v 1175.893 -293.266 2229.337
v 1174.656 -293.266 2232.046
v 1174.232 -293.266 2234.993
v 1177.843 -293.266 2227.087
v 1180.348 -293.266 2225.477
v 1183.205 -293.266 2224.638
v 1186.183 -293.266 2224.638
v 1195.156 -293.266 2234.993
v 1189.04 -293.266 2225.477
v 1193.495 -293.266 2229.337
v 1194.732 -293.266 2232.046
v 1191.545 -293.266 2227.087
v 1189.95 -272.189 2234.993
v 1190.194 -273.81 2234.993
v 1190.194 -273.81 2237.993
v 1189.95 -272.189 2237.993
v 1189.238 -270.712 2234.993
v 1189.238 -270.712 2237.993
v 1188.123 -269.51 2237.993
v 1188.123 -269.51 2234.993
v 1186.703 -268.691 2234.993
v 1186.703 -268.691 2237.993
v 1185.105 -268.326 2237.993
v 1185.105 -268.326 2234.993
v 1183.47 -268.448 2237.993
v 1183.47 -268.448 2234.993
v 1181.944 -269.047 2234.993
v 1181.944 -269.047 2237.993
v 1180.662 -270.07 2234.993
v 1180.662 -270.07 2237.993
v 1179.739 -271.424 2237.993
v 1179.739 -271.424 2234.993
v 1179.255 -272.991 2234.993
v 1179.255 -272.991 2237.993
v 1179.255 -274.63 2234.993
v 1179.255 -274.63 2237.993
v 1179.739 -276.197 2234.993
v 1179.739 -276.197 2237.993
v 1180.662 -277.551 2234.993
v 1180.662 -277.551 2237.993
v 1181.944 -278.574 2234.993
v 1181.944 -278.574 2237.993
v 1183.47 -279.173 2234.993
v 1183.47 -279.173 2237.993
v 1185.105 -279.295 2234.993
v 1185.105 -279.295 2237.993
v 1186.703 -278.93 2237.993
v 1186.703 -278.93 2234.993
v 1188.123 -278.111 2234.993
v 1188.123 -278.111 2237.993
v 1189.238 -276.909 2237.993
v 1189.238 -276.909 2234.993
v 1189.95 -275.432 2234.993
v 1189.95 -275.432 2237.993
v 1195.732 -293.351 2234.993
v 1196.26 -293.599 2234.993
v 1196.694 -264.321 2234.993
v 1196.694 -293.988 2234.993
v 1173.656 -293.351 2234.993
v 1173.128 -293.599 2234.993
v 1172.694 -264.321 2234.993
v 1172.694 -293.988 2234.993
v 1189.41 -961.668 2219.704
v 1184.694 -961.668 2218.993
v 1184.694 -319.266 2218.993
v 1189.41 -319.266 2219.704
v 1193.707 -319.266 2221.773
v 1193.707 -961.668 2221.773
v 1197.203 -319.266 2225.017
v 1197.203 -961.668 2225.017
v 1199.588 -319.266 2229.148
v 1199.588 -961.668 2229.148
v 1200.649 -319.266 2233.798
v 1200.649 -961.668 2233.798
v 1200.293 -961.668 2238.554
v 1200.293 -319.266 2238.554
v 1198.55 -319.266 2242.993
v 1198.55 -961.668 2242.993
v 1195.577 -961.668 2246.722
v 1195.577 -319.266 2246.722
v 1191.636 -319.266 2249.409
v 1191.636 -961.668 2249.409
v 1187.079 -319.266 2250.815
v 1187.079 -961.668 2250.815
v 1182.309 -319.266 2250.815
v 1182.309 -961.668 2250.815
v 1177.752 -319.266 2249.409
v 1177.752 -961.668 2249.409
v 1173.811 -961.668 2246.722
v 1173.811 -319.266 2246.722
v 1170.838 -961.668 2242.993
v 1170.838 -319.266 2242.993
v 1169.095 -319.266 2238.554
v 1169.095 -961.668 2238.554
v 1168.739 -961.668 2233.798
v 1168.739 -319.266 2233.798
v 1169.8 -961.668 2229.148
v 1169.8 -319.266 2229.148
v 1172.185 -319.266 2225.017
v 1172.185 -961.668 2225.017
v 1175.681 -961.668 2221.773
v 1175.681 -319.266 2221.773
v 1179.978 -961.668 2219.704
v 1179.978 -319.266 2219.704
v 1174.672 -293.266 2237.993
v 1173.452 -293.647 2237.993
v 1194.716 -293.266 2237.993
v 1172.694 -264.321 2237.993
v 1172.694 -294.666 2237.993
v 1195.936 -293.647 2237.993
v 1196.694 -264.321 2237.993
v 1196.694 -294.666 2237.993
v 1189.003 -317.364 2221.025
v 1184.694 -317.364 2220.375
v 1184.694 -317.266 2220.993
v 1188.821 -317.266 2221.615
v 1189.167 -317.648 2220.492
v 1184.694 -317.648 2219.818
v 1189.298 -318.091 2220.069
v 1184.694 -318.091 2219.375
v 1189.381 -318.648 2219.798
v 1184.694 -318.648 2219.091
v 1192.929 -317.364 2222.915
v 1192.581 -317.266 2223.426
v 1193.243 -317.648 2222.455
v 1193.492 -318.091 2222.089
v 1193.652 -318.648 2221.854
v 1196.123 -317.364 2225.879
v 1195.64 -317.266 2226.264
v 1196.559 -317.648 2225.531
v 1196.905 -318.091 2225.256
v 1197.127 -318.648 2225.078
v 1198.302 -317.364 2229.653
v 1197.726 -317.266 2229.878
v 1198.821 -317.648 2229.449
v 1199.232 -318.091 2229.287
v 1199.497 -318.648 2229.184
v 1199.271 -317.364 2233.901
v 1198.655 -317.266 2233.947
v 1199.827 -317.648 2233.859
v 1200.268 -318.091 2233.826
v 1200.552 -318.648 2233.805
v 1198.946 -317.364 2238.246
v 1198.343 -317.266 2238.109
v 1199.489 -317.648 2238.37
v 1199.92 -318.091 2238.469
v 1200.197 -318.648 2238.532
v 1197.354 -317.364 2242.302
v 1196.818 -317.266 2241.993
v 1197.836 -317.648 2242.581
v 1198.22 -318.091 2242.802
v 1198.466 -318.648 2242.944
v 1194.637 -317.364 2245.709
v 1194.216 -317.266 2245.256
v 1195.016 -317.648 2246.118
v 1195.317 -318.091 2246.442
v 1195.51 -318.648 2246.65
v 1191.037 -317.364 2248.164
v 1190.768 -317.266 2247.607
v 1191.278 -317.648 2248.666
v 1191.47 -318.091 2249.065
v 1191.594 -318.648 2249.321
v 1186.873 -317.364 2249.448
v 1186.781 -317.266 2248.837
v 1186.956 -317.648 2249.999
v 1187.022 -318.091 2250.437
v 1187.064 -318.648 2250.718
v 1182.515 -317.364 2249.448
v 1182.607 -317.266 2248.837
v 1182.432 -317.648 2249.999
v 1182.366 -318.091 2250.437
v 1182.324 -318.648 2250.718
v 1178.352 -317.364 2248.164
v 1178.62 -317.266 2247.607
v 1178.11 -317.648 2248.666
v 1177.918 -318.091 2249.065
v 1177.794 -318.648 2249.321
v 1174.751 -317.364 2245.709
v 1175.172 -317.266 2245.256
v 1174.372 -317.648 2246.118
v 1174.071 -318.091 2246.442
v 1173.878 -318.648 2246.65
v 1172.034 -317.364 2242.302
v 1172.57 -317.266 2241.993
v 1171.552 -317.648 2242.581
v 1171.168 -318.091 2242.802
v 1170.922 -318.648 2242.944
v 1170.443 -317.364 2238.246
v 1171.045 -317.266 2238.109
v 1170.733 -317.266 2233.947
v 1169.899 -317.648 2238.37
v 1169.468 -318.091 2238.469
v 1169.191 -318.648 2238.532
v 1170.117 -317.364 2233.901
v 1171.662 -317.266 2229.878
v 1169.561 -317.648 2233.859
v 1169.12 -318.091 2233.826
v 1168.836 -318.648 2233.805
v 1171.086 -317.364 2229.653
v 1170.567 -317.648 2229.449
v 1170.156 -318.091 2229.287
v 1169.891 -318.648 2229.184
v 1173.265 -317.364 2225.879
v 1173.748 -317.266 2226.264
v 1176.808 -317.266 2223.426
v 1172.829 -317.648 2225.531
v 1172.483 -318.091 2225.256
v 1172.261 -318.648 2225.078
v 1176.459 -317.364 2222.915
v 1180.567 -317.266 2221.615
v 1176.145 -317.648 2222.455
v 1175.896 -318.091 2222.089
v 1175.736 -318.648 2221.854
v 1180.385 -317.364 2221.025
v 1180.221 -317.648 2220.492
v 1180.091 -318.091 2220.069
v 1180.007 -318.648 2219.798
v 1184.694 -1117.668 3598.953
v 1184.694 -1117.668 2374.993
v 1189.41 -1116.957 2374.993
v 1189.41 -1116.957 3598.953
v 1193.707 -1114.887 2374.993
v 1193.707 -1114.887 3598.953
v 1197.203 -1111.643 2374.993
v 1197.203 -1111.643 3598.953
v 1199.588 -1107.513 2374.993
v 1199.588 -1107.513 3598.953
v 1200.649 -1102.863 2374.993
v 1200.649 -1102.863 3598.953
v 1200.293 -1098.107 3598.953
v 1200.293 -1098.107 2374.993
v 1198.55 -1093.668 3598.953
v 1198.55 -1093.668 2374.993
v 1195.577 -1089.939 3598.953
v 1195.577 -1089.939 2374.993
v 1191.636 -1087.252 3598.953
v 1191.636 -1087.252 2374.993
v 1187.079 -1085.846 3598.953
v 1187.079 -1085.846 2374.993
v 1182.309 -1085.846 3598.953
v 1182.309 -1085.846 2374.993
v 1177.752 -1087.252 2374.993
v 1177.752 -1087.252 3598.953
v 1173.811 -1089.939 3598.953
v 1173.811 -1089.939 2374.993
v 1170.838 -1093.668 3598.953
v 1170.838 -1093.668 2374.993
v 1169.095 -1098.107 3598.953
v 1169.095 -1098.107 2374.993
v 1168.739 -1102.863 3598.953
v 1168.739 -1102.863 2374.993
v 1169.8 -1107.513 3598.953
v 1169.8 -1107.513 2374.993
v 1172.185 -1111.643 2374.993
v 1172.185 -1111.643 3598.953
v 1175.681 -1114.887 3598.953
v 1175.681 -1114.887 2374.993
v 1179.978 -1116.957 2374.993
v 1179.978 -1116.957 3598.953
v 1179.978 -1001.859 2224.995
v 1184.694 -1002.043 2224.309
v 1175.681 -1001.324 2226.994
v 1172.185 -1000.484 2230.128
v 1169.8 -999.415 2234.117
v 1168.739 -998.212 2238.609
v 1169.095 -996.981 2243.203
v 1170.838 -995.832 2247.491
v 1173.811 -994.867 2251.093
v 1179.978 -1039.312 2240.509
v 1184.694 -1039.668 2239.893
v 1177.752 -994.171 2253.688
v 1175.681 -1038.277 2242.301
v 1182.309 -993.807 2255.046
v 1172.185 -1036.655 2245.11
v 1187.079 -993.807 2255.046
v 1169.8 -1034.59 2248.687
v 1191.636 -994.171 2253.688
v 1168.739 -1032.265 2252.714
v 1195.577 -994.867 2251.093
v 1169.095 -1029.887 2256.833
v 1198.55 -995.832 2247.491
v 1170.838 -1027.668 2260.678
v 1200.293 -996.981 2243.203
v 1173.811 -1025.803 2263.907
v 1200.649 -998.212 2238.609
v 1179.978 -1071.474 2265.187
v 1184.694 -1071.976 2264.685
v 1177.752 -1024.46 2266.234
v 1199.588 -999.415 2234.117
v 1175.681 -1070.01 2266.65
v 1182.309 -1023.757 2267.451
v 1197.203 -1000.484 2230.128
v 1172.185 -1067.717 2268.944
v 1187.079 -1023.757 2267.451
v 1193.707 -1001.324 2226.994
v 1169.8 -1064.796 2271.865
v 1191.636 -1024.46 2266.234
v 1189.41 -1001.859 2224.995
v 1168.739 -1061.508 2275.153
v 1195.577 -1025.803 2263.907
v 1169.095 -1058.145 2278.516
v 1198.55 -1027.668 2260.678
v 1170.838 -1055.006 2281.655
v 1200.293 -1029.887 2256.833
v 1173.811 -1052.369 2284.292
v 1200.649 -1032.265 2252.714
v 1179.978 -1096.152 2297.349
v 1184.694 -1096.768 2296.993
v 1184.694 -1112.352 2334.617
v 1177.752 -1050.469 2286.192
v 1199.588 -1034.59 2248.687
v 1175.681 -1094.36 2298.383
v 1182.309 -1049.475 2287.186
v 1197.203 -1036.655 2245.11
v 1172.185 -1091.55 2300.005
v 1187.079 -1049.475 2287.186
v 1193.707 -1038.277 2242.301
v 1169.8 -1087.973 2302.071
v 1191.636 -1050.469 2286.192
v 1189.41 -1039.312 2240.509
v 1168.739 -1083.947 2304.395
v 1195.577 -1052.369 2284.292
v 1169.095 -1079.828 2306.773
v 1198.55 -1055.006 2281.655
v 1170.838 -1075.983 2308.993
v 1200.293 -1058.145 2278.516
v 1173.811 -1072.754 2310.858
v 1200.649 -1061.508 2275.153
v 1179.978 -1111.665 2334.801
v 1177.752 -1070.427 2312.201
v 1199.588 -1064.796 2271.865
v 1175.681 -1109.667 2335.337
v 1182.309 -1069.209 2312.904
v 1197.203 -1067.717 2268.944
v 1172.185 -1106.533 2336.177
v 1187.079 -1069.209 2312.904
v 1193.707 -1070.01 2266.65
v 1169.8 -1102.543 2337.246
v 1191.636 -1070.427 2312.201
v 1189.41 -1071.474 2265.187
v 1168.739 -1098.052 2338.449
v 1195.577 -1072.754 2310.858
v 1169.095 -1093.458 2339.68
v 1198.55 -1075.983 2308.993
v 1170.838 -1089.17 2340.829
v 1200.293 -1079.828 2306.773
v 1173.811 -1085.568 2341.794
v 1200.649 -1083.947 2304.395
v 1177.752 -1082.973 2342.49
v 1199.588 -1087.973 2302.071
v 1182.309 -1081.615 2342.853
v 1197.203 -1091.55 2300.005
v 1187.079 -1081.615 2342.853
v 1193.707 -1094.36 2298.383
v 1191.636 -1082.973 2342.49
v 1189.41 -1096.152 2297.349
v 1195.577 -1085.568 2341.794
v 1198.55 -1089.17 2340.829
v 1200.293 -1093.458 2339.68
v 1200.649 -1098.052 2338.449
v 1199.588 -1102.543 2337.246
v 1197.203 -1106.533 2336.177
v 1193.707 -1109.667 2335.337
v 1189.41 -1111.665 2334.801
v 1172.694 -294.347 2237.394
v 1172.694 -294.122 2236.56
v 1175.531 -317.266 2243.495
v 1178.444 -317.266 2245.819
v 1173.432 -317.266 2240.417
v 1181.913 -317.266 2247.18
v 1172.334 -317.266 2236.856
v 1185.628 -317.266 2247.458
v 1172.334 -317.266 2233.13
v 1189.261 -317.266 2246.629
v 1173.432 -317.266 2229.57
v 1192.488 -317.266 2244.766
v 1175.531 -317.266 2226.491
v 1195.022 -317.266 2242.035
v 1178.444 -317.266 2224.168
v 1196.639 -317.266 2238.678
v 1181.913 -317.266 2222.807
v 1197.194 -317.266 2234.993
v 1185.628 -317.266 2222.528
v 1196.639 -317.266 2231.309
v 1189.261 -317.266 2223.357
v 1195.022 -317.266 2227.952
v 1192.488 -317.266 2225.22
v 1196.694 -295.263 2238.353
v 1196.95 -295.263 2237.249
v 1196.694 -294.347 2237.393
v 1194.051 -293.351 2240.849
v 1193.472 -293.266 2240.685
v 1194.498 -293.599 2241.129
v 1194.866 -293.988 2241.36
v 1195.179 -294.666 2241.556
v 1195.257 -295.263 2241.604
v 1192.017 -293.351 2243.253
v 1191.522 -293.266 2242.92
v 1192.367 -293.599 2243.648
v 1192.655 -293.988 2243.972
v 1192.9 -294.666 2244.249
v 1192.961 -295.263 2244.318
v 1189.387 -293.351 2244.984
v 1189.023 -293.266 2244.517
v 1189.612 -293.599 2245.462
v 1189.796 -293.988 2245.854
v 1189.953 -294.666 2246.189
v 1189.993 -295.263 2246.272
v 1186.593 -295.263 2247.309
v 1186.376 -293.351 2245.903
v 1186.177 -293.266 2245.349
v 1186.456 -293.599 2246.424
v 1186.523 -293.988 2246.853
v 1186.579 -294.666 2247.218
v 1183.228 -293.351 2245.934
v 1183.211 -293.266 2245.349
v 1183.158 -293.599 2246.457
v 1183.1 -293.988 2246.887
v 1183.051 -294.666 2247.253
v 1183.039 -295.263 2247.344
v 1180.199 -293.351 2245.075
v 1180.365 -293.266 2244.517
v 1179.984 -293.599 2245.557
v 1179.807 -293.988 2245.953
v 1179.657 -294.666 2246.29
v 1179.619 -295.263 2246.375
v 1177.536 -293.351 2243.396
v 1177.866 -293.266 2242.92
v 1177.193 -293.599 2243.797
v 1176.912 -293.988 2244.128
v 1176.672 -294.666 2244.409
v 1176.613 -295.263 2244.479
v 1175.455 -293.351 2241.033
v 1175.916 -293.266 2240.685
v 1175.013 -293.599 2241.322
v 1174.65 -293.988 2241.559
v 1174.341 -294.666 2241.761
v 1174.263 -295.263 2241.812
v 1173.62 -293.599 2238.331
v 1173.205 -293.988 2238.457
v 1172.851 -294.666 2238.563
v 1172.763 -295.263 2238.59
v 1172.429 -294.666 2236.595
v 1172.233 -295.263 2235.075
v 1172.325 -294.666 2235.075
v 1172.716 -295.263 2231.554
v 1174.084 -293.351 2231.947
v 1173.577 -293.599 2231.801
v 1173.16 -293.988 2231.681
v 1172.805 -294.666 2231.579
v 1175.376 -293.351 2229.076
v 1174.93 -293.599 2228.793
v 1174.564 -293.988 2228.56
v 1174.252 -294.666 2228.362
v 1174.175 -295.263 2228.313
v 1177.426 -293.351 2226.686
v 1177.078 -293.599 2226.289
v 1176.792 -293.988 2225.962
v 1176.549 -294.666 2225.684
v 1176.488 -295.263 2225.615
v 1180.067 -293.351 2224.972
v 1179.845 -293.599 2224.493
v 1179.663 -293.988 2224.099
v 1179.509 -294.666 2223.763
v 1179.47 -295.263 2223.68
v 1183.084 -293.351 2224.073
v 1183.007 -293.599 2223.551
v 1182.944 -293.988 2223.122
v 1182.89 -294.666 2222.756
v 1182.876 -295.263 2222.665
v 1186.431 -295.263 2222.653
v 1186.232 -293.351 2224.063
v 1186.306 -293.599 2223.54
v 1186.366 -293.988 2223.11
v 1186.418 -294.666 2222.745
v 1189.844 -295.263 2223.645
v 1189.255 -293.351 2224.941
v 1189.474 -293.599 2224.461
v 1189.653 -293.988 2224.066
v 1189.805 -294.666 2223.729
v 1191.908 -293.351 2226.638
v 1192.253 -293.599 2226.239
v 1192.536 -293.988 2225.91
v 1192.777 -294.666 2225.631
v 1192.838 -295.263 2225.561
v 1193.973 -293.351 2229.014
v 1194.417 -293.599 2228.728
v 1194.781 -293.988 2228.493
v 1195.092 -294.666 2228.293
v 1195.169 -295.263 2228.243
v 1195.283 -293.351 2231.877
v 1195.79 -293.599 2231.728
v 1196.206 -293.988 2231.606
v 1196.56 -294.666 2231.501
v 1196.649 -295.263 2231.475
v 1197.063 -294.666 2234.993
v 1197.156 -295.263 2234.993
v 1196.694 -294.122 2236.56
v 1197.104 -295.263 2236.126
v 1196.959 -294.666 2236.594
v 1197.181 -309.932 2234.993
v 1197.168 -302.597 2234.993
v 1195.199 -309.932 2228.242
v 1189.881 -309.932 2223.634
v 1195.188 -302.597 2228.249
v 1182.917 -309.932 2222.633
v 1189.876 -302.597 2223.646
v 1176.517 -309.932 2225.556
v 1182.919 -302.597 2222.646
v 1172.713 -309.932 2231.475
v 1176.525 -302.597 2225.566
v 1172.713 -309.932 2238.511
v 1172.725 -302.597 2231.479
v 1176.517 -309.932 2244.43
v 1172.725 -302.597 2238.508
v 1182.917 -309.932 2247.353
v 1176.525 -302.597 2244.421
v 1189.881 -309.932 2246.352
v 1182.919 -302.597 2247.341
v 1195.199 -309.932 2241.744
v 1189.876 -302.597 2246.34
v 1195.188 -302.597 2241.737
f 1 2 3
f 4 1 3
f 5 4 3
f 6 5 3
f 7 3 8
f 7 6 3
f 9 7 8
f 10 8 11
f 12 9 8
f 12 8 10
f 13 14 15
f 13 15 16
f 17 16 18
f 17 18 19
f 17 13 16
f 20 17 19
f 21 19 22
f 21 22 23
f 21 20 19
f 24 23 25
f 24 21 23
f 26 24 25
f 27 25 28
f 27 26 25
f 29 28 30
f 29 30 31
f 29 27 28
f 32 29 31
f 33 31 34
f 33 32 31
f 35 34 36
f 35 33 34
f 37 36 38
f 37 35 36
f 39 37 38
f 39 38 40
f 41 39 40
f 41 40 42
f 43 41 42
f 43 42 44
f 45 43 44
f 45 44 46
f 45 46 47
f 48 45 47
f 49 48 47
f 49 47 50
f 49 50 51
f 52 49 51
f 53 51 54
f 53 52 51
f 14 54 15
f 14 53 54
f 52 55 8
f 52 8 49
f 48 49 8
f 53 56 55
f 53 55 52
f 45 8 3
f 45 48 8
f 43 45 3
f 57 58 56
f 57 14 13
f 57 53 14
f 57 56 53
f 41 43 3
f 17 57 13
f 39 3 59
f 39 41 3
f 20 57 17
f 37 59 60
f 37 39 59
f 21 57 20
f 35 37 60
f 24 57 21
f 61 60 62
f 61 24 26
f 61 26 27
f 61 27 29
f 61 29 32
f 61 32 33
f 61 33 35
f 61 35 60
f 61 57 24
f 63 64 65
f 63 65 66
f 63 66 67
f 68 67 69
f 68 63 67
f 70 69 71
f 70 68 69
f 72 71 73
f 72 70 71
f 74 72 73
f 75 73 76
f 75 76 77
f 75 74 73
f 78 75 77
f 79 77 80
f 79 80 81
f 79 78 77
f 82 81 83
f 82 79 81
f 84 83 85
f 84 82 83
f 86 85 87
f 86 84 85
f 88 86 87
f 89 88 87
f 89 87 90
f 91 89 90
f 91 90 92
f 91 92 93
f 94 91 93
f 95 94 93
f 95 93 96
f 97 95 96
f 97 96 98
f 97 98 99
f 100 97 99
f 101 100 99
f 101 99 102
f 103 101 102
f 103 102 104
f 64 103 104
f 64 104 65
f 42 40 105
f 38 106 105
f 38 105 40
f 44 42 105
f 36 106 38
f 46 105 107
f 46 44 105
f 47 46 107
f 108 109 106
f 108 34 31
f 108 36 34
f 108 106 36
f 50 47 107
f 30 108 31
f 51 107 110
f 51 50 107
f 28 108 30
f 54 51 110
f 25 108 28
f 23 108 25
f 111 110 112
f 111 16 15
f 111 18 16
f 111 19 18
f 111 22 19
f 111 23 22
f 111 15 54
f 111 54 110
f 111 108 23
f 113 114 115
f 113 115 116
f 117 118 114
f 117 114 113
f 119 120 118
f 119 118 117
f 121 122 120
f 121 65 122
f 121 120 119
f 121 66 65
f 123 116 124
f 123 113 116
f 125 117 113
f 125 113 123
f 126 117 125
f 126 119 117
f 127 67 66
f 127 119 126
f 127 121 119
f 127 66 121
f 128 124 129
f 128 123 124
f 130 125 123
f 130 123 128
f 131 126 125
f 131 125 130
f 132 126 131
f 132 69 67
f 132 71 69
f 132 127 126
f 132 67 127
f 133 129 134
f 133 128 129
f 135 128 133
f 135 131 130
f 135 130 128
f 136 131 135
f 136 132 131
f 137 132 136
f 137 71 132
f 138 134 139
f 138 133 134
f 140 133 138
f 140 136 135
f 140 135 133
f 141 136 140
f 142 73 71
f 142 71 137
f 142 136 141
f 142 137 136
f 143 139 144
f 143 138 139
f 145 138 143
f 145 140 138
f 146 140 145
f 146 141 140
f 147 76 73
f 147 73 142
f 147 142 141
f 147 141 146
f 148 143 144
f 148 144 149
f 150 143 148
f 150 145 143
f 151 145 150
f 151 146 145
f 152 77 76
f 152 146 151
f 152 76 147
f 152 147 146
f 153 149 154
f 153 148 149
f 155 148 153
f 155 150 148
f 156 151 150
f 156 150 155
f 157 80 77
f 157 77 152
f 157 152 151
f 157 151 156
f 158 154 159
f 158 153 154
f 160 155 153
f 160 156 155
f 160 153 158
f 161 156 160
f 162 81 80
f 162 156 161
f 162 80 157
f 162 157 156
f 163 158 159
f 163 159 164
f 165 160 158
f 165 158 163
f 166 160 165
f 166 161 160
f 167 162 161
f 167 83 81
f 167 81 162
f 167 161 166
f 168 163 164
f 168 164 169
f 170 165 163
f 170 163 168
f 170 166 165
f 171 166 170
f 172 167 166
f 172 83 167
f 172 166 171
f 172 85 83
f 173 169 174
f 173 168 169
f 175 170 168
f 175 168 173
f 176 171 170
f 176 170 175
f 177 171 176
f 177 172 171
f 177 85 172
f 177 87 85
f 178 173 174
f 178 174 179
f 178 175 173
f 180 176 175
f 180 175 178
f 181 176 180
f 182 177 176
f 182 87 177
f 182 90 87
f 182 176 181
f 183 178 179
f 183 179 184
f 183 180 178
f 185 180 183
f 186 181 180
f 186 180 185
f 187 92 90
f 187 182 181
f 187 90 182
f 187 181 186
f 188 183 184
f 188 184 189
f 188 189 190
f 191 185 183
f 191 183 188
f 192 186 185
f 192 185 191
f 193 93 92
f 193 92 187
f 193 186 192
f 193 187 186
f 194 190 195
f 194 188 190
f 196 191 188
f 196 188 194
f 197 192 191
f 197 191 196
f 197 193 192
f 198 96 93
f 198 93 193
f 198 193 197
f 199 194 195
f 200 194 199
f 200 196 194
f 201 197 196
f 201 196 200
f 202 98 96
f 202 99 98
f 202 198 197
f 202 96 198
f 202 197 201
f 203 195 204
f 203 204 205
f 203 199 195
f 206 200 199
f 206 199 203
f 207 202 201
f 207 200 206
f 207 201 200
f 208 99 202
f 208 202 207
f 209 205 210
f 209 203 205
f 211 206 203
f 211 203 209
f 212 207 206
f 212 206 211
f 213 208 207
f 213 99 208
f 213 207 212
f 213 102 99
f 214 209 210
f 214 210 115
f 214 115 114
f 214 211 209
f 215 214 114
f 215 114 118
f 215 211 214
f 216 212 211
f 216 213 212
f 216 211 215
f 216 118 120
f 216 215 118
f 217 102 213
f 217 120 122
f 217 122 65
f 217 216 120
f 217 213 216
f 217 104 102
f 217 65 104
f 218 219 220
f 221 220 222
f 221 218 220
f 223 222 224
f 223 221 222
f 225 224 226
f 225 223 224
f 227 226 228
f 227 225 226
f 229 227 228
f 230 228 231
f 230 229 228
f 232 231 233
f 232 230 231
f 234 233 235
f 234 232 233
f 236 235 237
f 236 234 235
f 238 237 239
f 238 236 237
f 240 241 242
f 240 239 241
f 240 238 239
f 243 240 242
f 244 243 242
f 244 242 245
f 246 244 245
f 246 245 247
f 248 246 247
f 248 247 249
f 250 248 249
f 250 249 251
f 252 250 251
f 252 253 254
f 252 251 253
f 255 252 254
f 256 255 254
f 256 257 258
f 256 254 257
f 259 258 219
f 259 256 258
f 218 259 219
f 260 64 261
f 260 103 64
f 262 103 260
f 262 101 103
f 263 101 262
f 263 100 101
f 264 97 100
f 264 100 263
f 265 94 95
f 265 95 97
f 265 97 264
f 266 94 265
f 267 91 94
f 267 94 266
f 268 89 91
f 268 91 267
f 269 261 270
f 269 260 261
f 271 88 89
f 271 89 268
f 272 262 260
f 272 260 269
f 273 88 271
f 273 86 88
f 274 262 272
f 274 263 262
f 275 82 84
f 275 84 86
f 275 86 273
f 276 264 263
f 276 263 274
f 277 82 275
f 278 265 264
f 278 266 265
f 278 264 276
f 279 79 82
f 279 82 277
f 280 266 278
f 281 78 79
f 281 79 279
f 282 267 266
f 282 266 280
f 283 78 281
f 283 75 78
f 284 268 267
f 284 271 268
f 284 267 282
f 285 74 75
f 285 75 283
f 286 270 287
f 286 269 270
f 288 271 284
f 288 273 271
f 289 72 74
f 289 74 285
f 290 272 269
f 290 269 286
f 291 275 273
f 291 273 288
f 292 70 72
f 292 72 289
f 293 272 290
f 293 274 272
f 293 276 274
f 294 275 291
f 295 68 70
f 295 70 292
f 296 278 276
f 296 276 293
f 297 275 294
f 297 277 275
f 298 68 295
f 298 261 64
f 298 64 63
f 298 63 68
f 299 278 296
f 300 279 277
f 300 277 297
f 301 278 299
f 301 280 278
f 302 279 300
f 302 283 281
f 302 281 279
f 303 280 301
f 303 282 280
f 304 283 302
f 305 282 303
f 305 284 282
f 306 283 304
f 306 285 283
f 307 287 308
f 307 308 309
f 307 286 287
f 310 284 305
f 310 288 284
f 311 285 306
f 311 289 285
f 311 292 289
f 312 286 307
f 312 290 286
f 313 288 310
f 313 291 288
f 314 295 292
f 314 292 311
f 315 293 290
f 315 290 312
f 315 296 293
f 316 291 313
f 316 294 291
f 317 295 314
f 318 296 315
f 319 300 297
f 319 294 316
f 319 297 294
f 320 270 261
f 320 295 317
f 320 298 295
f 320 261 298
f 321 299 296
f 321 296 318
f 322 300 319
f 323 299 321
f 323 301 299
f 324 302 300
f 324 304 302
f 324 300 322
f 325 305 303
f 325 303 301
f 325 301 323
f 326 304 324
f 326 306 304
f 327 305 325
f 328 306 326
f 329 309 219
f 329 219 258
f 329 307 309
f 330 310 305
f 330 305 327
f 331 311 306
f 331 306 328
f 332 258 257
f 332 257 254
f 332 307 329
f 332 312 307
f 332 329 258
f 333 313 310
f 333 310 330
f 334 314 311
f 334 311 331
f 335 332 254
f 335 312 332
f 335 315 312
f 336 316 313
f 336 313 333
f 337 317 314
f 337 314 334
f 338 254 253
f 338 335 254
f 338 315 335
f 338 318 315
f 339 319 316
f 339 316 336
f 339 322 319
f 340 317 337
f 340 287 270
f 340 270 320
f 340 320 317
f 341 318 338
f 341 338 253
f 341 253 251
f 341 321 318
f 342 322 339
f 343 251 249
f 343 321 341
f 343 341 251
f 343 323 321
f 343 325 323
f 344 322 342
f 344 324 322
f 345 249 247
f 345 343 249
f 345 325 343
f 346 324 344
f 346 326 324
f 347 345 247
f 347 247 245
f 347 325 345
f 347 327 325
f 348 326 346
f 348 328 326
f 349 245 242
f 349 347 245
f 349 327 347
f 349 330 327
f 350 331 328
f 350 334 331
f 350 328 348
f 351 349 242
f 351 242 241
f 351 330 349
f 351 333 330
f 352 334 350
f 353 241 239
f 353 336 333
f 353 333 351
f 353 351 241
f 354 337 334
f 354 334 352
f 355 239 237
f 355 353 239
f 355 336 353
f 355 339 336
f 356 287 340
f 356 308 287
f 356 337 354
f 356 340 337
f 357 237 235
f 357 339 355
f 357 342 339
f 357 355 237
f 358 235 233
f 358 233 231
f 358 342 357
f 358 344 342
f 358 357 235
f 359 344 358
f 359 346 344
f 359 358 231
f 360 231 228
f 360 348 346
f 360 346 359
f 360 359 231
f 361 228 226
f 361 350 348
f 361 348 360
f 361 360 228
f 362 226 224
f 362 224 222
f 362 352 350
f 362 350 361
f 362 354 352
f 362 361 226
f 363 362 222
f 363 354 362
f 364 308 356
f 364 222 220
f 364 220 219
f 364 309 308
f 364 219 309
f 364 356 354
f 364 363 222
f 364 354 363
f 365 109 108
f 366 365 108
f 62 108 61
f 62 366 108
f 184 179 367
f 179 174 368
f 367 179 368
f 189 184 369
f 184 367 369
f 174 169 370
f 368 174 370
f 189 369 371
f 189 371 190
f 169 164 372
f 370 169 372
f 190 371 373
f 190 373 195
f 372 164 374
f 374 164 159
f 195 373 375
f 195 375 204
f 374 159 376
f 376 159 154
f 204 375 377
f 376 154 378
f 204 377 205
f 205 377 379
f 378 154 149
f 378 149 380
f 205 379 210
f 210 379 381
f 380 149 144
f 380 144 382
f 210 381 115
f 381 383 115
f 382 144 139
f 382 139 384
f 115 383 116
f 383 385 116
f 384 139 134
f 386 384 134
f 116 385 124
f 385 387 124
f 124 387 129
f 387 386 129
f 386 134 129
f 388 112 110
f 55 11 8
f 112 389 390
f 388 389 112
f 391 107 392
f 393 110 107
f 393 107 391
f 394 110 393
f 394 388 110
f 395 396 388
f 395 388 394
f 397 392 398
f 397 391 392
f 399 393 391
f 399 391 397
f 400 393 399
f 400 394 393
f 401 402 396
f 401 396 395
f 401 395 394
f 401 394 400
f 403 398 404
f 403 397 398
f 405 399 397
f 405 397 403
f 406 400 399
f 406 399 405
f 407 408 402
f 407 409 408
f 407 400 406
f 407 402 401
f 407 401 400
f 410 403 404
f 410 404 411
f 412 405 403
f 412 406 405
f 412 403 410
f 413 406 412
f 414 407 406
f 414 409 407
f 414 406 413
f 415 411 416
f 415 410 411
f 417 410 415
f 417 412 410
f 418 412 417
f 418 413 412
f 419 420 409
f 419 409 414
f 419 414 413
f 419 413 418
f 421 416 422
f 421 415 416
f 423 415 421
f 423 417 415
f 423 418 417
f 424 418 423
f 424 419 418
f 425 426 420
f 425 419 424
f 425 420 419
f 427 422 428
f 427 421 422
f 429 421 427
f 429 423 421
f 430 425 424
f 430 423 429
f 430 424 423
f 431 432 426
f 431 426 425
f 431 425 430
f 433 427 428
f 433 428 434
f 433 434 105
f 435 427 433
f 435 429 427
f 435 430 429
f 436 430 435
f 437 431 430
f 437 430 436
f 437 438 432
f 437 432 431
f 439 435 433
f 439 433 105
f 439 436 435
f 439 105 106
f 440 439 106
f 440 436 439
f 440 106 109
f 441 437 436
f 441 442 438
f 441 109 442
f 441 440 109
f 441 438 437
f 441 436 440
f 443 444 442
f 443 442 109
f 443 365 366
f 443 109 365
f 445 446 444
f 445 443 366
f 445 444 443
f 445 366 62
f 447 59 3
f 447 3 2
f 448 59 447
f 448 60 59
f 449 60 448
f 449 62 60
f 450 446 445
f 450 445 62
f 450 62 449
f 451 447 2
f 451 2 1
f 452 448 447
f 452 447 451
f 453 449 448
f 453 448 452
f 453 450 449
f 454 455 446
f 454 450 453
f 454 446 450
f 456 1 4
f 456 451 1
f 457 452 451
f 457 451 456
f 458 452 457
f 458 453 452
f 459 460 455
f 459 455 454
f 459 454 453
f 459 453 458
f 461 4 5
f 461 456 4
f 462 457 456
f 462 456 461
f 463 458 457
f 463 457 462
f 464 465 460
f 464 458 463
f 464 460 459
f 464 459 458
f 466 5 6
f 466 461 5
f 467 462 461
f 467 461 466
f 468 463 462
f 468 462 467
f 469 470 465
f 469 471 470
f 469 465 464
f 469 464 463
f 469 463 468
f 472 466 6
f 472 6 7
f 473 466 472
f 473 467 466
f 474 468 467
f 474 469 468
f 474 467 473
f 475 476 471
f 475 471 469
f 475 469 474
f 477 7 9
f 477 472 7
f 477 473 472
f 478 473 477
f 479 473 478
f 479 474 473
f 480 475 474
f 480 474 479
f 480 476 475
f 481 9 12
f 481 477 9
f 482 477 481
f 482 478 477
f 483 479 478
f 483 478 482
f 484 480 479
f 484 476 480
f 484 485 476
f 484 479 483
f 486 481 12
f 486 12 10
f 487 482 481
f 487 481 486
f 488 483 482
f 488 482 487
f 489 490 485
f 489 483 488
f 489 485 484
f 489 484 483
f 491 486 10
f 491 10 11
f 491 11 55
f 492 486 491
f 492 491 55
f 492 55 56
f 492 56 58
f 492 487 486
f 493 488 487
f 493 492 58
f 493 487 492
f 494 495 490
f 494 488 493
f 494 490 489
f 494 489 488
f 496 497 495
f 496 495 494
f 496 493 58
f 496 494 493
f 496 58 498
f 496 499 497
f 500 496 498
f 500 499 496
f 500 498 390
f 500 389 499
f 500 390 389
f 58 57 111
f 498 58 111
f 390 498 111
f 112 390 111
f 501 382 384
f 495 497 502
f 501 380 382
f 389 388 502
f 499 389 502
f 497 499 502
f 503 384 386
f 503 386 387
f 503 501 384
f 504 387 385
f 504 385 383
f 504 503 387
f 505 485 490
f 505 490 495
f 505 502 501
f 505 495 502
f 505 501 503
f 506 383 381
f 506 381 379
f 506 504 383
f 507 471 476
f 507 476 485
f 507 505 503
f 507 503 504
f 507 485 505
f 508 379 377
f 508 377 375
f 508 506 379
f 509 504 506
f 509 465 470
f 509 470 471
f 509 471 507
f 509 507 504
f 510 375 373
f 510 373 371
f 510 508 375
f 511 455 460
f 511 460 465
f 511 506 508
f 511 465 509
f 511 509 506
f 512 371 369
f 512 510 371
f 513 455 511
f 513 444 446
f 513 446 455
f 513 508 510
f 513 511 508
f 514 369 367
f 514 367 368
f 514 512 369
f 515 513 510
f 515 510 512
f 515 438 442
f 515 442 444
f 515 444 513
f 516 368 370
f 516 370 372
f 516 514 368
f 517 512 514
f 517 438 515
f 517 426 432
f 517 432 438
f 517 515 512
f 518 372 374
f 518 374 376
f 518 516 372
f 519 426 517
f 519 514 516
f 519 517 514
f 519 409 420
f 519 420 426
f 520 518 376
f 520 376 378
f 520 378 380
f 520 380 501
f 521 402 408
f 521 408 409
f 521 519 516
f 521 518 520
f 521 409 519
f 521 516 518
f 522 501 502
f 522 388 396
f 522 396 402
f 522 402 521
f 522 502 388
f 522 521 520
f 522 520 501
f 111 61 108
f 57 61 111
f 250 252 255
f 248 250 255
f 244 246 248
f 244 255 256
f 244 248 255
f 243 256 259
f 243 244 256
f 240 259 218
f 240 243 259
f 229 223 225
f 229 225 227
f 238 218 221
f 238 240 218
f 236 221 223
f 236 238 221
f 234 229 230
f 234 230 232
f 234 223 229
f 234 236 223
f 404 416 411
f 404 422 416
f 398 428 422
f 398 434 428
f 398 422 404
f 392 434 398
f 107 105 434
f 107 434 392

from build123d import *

# Parameters (mm, degrees)
BARRER1_PROFILE_R       = 16
CROQUIS22_W             = 24
CROQUIS22_H             = 30
CROQUIS22_R             = 5.5
SALIENTE_EXTRUIR1_DEPTH = 3
CROQUIS23_R             = 12.5
SALIENTE_EXTRUIR2_DEPTH = 24
SALIENTE_EXTRUIR2_TAPER = 0.1
REDONDEO1_R             = 2
REDONDEO2_R             = 2


with BuildPart() as part:
    # Barrer1: sweep along a curve in space
    with BuildLine() as barrer1_path:
        Line((1184.694036121, -317.266225222, 2234.993228397), (1184.694036121, -961.667575773, 2234.993228397))
        ThreePointArc((1184.694036121, -961.667575773, 2234.993228397), (1184.694036121, -1060.66252514, 2275.998279031), (1184.694036121, -1101.667575773, 2374.993228397))
        Line((1184.694036121, -1101.667575773, 2374.993228397), (1184.694036121, -1101.667575773, 3598.952990458))
    # Barrer1 profile (on start of the path) → Barrer1 (sweep)
    with BuildSketch(Plane(origin=(1184.694036121, -317.266225222, 2234.993228397), x_dir=(0, 0, -1), z_dir=(0, -1, 0))):
        Circle(BARRER1_PROFILE_R)
    sweep(path=barrer1_path.line)



with BuildPart() as body_2:
    # Croquis22 → Saliente-Extruir1 (new body)
    with BuildSketch(Plane.XY.offset(2234.993228397)):
        with Locations((1184.694036121, -279.321290843)):
            Rectangle(CROQUIS22_W, CROQUIS22_H)
        with Locations((1184.694036121, -273.810487485)):
            Circle(CROQUIS22_R, mode=Mode.SUBTRACT)
    extrude(amount=SALIENTE_EXTRUIR1_DEPTH)


with BuildPart() as part_1:
    add(part.part)

    add(body_2.part)  # Saliente-Extruir2 merges body 2
    # Croquis23 → Saliente-Extruir2 (add)
    with BuildSketch(Plane(origin=(0, -317.266225222, 0), x_dir=(1, 0, 0), z_dir=(0, 1, 0))):
        with Locations((1184.694036121, -2234.993228397)):
            Circle(CROQUIS23_R)
    extrude(amount=SALIENTE_EXTRUIR2_DEPTH, taper=SALIENTE_EXTRUIR2_TAPER)

    # Redondeo1
    # the kernel refuses this fillet: 2 mm, written as the material it takes off along each edge
    with BuildSketch(Plane(origin=(1184.694036121, -293.266225222, 2234.993228397), x_dir=(1, 0, 0), z_dir=(0, 0, -1))) as redondeo1_piece_1_section:
        with BuildLine():
            CenterArc((12.458112055 - REDONDEO1_R * 0.998256192065, REDONDEO1_R), REDONDEO1_R, 270, 89.9)
            Line((12.458112055 - REDONDEO1_R * 0.998256192065, 0), (12.458112055, 0))
            Line((12.458112055, 0), (12.458112055 + REDONDEO1_R * 0.00174228484855, REDONDEO1_R * 0.998254671634))
        make_face()
    redondeo1_piece_1 = revolve(axis=Axis((1184.694036121, -293.266225222, 2234.993228397), (0, -1, 0)), mode=Mode.PRIVATE)
    redondeo1_piece_1 = split(redondeo1_piece_1, bisect_by=Plane(origin=(1196.694036121, -293.909040816, 2236.28595065), z_dir=(1, 0, 0)), keep=Keep.TOP, mode=Mode.PRIVATE)
    add(redondeo1_piece_1, mode=Mode.SUBTRACT)
    with BuildSketch(Plane(origin=(1184.694036121, -293.266225222, 2234.993228397), x_dir=(1, 0, 0), z_dir=(0, 0, -1))) as redondeo1_piece_2_section:
        with BuildLine():
            CenterArc((12.458112055 - REDONDEO1_R * 0.998256192065, REDONDEO1_R), REDONDEO1_R, 270, 89.9)
            Line((12.458112055 - REDONDEO1_R * 0.998256192065, 0), (12.458112055, 0))
            Line((12.458112055, 0), (12.458112055 + REDONDEO1_R * 0.00174228484855, REDONDEO1_R * 0.998254671634))
        make_face()
    redondeo1_piece_2 = revolve(axis=Axis((1184.694036121, -293.266225222, 2234.993228397), (0, -1, 0)), mode=Mode.PRIVATE)
    redondeo1_piece_2 = split(redondeo1_piece_2, bisect_by=Plane(origin=(1184.694036121, -293.82884964, 2234.993228397), z_dir=(0, 0, -1)), keep=Keep.TOP, mode=Mode.PRIVATE)
    add(redondeo1_piece_2, mode=Mode.SUBTRACT)
    with BuildSketch(Plane(origin=(1184.694036121, -293.266225222, 2234.993228397), x_dir=(1, 0, 0), z_dir=(0, 0, -1))) as redondeo1_piece_3_section:
        with BuildLine():
            CenterArc((12.458112055 - REDONDEO1_R * 0.998256192065, REDONDEO1_R), REDONDEO1_R, 270, 89.9)
            Line((12.458112055 - REDONDEO1_R * 0.998256192065, 0), (12.458112055, 0))
            Line((12.458112055, 0), (12.458112055 + REDONDEO1_R * 0.00174228484855, REDONDEO1_R * 0.998254671634))
        make_face()
    redondeo1_piece_3 = revolve(axis=Axis((1184.694036121, -293.266225222, 2234.993228397), (0, -1, 0)), mode=Mode.PRIVATE)
    redondeo1_piece_3 = split(redondeo1_piece_3, bisect_by=Plane(origin=(1184.694036121, -293.82954, 2237.993228397), z_dir=(0, 0, 1)), keep=Keep.TOP, mode=Mode.PRIVATE)
    add(redondeo1_piece_3, mode=Mode.SUBTRACT)
    with BuildSketch(Plane(origin=(1184.694036121, -293.266225222, 2234.993228397), x_dir=(1, 0, 0), z_dir=(0, 0, -1))) as redondeo1_piece_4_section:
        with BuildLine():
            CenterArc((12.458112055 - REDONDEO1_R * 0.998256192065, REDONDEO1_R), REDONDEO1_R, 270, 89.9)
            Line((12.458112055 - REDONDEO1_R * 0.998256192065, 0), (12.458112055, 0))
            Line((12.458112055, 0), (12.458112055 + REDONDEO1_R * 0.00174228484855, REDONDEO1_R * 0.998254671634))
        make_face()
    redondeo1_piece_4 = revolve(axis=Axis((1184.694036121, -293.266225222, 2234.993228397), (0, -1, 0)), mode=Mode.PRIVATE)
    redondeo1_piece_4 = split(redondeo1_piece_4, bisect_by=Plane(origin=(1172.694036121, -293.908477317, 2236.286131644), z_dir=(-1, 0, 0)), keep=Keep.TOP, mode=Mode.PRIVATE)
    add(redondeo1_piece_4, mode=Mode.SUBTRACT)

    # Redondeo2
    redondeo2_edges = [part_1.edges().sort_by_distance(p)[0] for p in [
        (1184.694036121, -317.266225222, 2250.993228397),
    ]]
    fillet(redondeo2_edges, radius=REDONDEO2_R)


solid = part_1.part
